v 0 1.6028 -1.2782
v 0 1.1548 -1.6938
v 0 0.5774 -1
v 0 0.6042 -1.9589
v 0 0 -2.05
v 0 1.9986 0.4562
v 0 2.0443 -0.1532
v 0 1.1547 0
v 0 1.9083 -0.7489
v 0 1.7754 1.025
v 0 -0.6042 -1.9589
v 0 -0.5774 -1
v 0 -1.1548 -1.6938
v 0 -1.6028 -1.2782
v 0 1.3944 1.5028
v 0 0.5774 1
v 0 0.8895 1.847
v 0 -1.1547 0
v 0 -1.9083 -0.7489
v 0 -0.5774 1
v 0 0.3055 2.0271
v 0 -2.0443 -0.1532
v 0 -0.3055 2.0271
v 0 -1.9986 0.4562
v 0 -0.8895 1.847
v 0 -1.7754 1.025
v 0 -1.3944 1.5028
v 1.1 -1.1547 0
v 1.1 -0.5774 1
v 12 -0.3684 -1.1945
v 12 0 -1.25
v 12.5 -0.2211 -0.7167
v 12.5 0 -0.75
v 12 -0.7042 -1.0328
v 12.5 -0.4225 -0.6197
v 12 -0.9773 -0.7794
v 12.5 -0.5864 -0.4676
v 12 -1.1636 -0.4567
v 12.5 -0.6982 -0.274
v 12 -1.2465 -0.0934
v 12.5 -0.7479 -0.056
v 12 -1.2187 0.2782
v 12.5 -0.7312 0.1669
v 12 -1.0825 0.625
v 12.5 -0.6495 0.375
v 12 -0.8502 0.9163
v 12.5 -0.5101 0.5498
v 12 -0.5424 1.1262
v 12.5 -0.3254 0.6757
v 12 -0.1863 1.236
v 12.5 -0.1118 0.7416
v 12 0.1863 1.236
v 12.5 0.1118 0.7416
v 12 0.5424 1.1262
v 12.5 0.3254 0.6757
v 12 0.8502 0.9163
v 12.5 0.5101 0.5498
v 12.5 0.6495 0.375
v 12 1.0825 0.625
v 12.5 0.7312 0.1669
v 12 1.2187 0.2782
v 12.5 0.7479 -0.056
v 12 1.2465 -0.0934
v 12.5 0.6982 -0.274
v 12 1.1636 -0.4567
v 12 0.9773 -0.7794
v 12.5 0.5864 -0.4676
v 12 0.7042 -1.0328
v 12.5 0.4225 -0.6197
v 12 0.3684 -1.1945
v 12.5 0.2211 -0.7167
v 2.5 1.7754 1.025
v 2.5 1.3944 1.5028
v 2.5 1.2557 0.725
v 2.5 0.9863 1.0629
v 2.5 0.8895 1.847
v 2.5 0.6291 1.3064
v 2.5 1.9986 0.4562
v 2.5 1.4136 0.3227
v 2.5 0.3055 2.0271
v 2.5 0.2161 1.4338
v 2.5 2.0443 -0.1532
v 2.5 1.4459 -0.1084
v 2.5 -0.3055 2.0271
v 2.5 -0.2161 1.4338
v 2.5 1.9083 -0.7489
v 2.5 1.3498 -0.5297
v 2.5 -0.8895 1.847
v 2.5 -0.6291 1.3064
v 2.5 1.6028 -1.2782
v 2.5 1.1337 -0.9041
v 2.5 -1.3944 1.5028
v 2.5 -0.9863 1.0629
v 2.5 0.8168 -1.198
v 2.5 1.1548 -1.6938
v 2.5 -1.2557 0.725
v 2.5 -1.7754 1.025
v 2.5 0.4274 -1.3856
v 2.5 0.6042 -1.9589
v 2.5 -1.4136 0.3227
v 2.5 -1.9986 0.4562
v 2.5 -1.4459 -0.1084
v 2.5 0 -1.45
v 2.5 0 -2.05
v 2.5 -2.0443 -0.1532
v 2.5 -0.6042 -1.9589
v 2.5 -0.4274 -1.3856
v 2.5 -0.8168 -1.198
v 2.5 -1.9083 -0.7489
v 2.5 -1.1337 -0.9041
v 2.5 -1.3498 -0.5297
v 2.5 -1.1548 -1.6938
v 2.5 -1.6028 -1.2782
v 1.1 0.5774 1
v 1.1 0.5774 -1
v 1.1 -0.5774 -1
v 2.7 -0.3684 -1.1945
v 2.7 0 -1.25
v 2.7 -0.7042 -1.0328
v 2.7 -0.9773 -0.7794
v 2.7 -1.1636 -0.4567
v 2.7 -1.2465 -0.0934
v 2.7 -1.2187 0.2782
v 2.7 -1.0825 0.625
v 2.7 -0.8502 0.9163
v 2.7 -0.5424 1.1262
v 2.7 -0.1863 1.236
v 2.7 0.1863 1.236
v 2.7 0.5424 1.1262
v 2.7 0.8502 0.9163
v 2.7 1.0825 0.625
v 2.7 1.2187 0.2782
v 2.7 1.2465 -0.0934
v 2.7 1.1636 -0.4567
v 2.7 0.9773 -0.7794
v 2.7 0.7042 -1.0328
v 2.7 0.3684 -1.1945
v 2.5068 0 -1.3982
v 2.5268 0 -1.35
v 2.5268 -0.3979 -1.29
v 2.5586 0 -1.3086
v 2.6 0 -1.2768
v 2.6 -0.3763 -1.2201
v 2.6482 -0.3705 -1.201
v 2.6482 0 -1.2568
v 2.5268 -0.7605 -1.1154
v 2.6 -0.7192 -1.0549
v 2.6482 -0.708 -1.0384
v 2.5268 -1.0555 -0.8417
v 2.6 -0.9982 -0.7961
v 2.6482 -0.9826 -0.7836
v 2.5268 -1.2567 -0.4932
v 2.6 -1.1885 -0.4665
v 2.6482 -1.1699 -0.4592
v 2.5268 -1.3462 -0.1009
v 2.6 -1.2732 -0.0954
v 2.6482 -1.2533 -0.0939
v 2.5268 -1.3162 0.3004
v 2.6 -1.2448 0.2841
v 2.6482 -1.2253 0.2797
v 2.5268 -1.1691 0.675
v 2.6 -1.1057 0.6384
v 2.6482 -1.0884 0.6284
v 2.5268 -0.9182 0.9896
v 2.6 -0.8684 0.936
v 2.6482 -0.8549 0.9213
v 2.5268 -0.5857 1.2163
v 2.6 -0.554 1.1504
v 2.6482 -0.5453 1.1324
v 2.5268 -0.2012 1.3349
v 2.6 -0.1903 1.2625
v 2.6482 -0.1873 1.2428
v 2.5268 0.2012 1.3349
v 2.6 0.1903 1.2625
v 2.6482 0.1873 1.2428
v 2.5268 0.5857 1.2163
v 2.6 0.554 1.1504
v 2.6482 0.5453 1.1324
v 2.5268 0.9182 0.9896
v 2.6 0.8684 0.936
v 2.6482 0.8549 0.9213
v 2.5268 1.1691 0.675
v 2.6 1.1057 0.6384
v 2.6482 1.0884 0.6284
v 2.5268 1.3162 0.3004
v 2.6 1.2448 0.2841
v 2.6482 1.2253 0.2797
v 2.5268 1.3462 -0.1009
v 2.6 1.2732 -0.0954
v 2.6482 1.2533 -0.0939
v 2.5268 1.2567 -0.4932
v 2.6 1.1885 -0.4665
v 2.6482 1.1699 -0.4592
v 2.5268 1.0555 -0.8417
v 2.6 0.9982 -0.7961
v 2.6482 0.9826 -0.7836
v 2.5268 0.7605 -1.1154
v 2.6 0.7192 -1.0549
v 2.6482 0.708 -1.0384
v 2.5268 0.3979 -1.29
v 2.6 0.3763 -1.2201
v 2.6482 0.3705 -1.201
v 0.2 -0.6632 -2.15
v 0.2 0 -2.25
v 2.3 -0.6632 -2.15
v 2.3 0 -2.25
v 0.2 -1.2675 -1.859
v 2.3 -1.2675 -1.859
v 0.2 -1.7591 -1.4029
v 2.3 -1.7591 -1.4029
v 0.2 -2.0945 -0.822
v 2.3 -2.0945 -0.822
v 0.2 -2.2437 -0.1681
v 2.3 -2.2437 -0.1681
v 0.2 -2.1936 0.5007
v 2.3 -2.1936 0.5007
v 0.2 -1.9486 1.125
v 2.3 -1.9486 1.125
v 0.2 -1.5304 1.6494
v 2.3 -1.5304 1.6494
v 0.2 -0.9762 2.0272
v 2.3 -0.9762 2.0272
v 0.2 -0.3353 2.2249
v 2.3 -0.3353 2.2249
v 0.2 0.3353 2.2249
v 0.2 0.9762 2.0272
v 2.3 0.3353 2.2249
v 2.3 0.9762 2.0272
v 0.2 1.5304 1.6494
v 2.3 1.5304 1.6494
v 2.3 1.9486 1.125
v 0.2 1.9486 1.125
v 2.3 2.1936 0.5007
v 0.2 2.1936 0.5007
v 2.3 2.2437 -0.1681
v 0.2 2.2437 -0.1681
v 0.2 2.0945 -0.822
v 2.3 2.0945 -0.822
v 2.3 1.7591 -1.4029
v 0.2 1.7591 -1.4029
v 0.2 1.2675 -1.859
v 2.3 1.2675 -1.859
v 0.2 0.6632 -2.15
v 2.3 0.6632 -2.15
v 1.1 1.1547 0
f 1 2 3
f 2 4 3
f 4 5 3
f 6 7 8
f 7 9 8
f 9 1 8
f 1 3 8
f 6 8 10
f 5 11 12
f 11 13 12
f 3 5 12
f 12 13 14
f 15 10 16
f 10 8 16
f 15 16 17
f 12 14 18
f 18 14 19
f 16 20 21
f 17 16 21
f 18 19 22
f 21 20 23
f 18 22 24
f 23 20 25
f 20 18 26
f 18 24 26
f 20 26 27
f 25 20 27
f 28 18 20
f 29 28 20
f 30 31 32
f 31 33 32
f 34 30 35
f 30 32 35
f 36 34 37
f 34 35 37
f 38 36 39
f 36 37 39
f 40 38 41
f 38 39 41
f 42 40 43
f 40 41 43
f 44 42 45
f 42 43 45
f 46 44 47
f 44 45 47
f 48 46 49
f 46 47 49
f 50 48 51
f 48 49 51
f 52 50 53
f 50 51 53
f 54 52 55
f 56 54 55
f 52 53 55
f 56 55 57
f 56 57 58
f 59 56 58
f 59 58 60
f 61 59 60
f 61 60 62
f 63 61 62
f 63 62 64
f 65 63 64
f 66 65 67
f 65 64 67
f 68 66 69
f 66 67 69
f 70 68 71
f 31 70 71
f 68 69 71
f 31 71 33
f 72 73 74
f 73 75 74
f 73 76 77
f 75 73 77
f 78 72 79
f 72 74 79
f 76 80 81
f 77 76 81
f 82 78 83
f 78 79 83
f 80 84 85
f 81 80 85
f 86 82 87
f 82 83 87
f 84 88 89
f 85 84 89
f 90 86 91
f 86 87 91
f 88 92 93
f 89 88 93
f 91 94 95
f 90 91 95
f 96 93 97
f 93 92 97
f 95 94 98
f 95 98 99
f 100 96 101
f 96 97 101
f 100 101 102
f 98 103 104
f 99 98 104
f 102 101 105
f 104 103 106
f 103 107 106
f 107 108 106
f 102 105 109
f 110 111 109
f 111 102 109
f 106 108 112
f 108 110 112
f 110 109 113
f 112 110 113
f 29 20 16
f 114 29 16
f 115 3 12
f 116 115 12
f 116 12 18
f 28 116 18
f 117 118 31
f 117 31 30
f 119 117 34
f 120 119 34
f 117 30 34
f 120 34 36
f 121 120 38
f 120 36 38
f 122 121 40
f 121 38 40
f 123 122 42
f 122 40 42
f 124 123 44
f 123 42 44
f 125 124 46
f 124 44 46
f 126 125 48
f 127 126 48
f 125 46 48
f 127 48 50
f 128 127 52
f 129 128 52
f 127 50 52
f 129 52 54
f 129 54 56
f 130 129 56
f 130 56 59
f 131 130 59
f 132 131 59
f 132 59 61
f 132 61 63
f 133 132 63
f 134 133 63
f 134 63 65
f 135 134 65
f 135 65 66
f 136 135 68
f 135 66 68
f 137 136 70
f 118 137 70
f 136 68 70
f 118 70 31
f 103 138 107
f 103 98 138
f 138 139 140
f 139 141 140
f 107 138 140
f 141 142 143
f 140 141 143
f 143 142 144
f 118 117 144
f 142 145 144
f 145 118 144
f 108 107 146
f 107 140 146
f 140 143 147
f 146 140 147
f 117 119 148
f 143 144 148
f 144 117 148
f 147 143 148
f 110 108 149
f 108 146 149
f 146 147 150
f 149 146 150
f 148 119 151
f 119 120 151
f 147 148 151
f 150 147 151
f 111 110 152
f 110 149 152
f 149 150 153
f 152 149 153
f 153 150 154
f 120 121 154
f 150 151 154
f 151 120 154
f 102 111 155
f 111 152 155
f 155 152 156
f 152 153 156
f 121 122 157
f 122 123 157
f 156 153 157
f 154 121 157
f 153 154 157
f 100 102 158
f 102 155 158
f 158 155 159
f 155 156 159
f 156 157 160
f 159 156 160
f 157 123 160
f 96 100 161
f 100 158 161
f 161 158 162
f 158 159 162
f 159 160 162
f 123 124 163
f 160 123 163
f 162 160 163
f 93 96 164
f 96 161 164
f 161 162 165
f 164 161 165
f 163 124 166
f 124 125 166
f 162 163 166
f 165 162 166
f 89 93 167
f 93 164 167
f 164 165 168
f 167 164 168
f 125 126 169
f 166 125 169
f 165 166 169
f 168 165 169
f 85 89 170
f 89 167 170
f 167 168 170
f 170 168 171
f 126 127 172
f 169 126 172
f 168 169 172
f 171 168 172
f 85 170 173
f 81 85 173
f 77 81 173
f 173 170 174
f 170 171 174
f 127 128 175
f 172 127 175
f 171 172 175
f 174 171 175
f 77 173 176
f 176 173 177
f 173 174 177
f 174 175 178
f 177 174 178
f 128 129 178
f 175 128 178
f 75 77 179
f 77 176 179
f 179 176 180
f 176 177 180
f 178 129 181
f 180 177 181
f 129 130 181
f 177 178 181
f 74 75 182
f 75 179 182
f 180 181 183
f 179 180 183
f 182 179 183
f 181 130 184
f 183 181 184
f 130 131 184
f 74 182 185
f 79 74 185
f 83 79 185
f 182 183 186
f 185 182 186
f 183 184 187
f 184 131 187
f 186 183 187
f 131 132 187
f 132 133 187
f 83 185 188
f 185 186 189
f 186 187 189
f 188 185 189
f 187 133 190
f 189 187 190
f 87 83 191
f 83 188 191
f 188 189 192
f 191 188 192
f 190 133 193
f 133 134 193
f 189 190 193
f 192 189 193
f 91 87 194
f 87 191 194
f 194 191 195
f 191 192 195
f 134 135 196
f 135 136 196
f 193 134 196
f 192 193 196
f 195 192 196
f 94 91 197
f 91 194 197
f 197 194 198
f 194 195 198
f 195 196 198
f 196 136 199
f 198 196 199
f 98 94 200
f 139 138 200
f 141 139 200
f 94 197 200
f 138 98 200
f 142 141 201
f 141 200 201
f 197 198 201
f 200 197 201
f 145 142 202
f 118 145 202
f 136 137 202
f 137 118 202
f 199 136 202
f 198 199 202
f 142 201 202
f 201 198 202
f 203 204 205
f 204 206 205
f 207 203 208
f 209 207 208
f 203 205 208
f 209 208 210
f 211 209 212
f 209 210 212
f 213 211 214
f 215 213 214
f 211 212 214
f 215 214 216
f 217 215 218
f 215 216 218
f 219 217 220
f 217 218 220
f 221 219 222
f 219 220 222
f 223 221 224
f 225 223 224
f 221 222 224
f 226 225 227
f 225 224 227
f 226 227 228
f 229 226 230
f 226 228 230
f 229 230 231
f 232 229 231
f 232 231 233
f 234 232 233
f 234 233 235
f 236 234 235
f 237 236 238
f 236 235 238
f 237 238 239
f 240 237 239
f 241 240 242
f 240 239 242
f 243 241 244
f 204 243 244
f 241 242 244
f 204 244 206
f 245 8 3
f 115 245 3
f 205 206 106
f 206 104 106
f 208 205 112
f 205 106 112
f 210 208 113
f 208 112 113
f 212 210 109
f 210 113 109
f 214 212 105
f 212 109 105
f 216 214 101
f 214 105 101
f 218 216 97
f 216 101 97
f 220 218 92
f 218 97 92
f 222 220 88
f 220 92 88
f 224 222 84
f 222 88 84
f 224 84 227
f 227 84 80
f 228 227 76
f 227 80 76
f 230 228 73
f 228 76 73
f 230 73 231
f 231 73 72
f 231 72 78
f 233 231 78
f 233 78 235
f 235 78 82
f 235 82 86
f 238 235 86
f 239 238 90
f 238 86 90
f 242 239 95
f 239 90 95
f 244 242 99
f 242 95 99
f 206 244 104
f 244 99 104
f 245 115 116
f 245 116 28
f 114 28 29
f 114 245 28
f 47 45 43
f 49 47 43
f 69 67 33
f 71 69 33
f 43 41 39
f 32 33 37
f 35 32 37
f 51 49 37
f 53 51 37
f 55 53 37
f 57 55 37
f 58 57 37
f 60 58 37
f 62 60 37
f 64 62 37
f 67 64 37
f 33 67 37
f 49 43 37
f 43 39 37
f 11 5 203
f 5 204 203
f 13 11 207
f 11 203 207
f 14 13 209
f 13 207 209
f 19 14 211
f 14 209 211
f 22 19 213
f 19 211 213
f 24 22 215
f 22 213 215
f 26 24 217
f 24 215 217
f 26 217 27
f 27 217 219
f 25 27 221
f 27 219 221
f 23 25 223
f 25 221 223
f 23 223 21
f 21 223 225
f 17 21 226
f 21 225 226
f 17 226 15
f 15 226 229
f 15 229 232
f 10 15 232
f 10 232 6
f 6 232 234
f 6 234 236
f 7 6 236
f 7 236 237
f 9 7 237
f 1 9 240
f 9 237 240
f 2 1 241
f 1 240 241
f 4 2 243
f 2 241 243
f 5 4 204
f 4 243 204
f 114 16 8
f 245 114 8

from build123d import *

# Parameters (mm, degrees)
CUT_EXTRUDE_1_DEPTH = 1.1


with BuildPart() as part:
    # Эскиз1 → Повернуть1 (revolve)
    with BuildSketch(Plane.XY, mode=Mode.PRIVATE) as revolve_1_sk:
        with BuildLine():
            Line((0, 0), (0, 2.05))
            Line((0, 2.05), (0.2, 2.25))
            Line((0.2, 2.25), (2.3, 2.25))
            Line((2.3, 2.25), (2.5, 2.05))
            Line((2.5, 2.05), (2.5, 1.45))
            ThreePointArc((2.5, 1.45), (2.558578644, 1.308578644), (2.7, 1.25))
            Line((2.7, 1.25), (12, 1.25))
            Line((12, 1.25), (12.5, 0.75))
            Line((12.5, 0.75), (12.5, 0))
            Line((12.5, 0), (0, 0))
        make_face()
    revolve(revolve_1_sk.sketch.rotate(Axis((0, 0, 0), (-1, 0, 0)), 90), axis=Axis((0, 0, 0), (-1, 0, 0)))

    # Эскиз2 → Вырез-Вытянуть1 (cut)
    with BuildSketch(Plane.ZY):
        Polygon((0, 1.154700538), (-1, 0.577350269), (-1, -0.577350269), (0, -1.154700538), (1, -0.577350269), (1, 0.577350269), align=None)
    extrude(amount=-CUT_EXTRUDE_1_DEPTH, mode=Mode.SUBTRACT)


solid = part.part
